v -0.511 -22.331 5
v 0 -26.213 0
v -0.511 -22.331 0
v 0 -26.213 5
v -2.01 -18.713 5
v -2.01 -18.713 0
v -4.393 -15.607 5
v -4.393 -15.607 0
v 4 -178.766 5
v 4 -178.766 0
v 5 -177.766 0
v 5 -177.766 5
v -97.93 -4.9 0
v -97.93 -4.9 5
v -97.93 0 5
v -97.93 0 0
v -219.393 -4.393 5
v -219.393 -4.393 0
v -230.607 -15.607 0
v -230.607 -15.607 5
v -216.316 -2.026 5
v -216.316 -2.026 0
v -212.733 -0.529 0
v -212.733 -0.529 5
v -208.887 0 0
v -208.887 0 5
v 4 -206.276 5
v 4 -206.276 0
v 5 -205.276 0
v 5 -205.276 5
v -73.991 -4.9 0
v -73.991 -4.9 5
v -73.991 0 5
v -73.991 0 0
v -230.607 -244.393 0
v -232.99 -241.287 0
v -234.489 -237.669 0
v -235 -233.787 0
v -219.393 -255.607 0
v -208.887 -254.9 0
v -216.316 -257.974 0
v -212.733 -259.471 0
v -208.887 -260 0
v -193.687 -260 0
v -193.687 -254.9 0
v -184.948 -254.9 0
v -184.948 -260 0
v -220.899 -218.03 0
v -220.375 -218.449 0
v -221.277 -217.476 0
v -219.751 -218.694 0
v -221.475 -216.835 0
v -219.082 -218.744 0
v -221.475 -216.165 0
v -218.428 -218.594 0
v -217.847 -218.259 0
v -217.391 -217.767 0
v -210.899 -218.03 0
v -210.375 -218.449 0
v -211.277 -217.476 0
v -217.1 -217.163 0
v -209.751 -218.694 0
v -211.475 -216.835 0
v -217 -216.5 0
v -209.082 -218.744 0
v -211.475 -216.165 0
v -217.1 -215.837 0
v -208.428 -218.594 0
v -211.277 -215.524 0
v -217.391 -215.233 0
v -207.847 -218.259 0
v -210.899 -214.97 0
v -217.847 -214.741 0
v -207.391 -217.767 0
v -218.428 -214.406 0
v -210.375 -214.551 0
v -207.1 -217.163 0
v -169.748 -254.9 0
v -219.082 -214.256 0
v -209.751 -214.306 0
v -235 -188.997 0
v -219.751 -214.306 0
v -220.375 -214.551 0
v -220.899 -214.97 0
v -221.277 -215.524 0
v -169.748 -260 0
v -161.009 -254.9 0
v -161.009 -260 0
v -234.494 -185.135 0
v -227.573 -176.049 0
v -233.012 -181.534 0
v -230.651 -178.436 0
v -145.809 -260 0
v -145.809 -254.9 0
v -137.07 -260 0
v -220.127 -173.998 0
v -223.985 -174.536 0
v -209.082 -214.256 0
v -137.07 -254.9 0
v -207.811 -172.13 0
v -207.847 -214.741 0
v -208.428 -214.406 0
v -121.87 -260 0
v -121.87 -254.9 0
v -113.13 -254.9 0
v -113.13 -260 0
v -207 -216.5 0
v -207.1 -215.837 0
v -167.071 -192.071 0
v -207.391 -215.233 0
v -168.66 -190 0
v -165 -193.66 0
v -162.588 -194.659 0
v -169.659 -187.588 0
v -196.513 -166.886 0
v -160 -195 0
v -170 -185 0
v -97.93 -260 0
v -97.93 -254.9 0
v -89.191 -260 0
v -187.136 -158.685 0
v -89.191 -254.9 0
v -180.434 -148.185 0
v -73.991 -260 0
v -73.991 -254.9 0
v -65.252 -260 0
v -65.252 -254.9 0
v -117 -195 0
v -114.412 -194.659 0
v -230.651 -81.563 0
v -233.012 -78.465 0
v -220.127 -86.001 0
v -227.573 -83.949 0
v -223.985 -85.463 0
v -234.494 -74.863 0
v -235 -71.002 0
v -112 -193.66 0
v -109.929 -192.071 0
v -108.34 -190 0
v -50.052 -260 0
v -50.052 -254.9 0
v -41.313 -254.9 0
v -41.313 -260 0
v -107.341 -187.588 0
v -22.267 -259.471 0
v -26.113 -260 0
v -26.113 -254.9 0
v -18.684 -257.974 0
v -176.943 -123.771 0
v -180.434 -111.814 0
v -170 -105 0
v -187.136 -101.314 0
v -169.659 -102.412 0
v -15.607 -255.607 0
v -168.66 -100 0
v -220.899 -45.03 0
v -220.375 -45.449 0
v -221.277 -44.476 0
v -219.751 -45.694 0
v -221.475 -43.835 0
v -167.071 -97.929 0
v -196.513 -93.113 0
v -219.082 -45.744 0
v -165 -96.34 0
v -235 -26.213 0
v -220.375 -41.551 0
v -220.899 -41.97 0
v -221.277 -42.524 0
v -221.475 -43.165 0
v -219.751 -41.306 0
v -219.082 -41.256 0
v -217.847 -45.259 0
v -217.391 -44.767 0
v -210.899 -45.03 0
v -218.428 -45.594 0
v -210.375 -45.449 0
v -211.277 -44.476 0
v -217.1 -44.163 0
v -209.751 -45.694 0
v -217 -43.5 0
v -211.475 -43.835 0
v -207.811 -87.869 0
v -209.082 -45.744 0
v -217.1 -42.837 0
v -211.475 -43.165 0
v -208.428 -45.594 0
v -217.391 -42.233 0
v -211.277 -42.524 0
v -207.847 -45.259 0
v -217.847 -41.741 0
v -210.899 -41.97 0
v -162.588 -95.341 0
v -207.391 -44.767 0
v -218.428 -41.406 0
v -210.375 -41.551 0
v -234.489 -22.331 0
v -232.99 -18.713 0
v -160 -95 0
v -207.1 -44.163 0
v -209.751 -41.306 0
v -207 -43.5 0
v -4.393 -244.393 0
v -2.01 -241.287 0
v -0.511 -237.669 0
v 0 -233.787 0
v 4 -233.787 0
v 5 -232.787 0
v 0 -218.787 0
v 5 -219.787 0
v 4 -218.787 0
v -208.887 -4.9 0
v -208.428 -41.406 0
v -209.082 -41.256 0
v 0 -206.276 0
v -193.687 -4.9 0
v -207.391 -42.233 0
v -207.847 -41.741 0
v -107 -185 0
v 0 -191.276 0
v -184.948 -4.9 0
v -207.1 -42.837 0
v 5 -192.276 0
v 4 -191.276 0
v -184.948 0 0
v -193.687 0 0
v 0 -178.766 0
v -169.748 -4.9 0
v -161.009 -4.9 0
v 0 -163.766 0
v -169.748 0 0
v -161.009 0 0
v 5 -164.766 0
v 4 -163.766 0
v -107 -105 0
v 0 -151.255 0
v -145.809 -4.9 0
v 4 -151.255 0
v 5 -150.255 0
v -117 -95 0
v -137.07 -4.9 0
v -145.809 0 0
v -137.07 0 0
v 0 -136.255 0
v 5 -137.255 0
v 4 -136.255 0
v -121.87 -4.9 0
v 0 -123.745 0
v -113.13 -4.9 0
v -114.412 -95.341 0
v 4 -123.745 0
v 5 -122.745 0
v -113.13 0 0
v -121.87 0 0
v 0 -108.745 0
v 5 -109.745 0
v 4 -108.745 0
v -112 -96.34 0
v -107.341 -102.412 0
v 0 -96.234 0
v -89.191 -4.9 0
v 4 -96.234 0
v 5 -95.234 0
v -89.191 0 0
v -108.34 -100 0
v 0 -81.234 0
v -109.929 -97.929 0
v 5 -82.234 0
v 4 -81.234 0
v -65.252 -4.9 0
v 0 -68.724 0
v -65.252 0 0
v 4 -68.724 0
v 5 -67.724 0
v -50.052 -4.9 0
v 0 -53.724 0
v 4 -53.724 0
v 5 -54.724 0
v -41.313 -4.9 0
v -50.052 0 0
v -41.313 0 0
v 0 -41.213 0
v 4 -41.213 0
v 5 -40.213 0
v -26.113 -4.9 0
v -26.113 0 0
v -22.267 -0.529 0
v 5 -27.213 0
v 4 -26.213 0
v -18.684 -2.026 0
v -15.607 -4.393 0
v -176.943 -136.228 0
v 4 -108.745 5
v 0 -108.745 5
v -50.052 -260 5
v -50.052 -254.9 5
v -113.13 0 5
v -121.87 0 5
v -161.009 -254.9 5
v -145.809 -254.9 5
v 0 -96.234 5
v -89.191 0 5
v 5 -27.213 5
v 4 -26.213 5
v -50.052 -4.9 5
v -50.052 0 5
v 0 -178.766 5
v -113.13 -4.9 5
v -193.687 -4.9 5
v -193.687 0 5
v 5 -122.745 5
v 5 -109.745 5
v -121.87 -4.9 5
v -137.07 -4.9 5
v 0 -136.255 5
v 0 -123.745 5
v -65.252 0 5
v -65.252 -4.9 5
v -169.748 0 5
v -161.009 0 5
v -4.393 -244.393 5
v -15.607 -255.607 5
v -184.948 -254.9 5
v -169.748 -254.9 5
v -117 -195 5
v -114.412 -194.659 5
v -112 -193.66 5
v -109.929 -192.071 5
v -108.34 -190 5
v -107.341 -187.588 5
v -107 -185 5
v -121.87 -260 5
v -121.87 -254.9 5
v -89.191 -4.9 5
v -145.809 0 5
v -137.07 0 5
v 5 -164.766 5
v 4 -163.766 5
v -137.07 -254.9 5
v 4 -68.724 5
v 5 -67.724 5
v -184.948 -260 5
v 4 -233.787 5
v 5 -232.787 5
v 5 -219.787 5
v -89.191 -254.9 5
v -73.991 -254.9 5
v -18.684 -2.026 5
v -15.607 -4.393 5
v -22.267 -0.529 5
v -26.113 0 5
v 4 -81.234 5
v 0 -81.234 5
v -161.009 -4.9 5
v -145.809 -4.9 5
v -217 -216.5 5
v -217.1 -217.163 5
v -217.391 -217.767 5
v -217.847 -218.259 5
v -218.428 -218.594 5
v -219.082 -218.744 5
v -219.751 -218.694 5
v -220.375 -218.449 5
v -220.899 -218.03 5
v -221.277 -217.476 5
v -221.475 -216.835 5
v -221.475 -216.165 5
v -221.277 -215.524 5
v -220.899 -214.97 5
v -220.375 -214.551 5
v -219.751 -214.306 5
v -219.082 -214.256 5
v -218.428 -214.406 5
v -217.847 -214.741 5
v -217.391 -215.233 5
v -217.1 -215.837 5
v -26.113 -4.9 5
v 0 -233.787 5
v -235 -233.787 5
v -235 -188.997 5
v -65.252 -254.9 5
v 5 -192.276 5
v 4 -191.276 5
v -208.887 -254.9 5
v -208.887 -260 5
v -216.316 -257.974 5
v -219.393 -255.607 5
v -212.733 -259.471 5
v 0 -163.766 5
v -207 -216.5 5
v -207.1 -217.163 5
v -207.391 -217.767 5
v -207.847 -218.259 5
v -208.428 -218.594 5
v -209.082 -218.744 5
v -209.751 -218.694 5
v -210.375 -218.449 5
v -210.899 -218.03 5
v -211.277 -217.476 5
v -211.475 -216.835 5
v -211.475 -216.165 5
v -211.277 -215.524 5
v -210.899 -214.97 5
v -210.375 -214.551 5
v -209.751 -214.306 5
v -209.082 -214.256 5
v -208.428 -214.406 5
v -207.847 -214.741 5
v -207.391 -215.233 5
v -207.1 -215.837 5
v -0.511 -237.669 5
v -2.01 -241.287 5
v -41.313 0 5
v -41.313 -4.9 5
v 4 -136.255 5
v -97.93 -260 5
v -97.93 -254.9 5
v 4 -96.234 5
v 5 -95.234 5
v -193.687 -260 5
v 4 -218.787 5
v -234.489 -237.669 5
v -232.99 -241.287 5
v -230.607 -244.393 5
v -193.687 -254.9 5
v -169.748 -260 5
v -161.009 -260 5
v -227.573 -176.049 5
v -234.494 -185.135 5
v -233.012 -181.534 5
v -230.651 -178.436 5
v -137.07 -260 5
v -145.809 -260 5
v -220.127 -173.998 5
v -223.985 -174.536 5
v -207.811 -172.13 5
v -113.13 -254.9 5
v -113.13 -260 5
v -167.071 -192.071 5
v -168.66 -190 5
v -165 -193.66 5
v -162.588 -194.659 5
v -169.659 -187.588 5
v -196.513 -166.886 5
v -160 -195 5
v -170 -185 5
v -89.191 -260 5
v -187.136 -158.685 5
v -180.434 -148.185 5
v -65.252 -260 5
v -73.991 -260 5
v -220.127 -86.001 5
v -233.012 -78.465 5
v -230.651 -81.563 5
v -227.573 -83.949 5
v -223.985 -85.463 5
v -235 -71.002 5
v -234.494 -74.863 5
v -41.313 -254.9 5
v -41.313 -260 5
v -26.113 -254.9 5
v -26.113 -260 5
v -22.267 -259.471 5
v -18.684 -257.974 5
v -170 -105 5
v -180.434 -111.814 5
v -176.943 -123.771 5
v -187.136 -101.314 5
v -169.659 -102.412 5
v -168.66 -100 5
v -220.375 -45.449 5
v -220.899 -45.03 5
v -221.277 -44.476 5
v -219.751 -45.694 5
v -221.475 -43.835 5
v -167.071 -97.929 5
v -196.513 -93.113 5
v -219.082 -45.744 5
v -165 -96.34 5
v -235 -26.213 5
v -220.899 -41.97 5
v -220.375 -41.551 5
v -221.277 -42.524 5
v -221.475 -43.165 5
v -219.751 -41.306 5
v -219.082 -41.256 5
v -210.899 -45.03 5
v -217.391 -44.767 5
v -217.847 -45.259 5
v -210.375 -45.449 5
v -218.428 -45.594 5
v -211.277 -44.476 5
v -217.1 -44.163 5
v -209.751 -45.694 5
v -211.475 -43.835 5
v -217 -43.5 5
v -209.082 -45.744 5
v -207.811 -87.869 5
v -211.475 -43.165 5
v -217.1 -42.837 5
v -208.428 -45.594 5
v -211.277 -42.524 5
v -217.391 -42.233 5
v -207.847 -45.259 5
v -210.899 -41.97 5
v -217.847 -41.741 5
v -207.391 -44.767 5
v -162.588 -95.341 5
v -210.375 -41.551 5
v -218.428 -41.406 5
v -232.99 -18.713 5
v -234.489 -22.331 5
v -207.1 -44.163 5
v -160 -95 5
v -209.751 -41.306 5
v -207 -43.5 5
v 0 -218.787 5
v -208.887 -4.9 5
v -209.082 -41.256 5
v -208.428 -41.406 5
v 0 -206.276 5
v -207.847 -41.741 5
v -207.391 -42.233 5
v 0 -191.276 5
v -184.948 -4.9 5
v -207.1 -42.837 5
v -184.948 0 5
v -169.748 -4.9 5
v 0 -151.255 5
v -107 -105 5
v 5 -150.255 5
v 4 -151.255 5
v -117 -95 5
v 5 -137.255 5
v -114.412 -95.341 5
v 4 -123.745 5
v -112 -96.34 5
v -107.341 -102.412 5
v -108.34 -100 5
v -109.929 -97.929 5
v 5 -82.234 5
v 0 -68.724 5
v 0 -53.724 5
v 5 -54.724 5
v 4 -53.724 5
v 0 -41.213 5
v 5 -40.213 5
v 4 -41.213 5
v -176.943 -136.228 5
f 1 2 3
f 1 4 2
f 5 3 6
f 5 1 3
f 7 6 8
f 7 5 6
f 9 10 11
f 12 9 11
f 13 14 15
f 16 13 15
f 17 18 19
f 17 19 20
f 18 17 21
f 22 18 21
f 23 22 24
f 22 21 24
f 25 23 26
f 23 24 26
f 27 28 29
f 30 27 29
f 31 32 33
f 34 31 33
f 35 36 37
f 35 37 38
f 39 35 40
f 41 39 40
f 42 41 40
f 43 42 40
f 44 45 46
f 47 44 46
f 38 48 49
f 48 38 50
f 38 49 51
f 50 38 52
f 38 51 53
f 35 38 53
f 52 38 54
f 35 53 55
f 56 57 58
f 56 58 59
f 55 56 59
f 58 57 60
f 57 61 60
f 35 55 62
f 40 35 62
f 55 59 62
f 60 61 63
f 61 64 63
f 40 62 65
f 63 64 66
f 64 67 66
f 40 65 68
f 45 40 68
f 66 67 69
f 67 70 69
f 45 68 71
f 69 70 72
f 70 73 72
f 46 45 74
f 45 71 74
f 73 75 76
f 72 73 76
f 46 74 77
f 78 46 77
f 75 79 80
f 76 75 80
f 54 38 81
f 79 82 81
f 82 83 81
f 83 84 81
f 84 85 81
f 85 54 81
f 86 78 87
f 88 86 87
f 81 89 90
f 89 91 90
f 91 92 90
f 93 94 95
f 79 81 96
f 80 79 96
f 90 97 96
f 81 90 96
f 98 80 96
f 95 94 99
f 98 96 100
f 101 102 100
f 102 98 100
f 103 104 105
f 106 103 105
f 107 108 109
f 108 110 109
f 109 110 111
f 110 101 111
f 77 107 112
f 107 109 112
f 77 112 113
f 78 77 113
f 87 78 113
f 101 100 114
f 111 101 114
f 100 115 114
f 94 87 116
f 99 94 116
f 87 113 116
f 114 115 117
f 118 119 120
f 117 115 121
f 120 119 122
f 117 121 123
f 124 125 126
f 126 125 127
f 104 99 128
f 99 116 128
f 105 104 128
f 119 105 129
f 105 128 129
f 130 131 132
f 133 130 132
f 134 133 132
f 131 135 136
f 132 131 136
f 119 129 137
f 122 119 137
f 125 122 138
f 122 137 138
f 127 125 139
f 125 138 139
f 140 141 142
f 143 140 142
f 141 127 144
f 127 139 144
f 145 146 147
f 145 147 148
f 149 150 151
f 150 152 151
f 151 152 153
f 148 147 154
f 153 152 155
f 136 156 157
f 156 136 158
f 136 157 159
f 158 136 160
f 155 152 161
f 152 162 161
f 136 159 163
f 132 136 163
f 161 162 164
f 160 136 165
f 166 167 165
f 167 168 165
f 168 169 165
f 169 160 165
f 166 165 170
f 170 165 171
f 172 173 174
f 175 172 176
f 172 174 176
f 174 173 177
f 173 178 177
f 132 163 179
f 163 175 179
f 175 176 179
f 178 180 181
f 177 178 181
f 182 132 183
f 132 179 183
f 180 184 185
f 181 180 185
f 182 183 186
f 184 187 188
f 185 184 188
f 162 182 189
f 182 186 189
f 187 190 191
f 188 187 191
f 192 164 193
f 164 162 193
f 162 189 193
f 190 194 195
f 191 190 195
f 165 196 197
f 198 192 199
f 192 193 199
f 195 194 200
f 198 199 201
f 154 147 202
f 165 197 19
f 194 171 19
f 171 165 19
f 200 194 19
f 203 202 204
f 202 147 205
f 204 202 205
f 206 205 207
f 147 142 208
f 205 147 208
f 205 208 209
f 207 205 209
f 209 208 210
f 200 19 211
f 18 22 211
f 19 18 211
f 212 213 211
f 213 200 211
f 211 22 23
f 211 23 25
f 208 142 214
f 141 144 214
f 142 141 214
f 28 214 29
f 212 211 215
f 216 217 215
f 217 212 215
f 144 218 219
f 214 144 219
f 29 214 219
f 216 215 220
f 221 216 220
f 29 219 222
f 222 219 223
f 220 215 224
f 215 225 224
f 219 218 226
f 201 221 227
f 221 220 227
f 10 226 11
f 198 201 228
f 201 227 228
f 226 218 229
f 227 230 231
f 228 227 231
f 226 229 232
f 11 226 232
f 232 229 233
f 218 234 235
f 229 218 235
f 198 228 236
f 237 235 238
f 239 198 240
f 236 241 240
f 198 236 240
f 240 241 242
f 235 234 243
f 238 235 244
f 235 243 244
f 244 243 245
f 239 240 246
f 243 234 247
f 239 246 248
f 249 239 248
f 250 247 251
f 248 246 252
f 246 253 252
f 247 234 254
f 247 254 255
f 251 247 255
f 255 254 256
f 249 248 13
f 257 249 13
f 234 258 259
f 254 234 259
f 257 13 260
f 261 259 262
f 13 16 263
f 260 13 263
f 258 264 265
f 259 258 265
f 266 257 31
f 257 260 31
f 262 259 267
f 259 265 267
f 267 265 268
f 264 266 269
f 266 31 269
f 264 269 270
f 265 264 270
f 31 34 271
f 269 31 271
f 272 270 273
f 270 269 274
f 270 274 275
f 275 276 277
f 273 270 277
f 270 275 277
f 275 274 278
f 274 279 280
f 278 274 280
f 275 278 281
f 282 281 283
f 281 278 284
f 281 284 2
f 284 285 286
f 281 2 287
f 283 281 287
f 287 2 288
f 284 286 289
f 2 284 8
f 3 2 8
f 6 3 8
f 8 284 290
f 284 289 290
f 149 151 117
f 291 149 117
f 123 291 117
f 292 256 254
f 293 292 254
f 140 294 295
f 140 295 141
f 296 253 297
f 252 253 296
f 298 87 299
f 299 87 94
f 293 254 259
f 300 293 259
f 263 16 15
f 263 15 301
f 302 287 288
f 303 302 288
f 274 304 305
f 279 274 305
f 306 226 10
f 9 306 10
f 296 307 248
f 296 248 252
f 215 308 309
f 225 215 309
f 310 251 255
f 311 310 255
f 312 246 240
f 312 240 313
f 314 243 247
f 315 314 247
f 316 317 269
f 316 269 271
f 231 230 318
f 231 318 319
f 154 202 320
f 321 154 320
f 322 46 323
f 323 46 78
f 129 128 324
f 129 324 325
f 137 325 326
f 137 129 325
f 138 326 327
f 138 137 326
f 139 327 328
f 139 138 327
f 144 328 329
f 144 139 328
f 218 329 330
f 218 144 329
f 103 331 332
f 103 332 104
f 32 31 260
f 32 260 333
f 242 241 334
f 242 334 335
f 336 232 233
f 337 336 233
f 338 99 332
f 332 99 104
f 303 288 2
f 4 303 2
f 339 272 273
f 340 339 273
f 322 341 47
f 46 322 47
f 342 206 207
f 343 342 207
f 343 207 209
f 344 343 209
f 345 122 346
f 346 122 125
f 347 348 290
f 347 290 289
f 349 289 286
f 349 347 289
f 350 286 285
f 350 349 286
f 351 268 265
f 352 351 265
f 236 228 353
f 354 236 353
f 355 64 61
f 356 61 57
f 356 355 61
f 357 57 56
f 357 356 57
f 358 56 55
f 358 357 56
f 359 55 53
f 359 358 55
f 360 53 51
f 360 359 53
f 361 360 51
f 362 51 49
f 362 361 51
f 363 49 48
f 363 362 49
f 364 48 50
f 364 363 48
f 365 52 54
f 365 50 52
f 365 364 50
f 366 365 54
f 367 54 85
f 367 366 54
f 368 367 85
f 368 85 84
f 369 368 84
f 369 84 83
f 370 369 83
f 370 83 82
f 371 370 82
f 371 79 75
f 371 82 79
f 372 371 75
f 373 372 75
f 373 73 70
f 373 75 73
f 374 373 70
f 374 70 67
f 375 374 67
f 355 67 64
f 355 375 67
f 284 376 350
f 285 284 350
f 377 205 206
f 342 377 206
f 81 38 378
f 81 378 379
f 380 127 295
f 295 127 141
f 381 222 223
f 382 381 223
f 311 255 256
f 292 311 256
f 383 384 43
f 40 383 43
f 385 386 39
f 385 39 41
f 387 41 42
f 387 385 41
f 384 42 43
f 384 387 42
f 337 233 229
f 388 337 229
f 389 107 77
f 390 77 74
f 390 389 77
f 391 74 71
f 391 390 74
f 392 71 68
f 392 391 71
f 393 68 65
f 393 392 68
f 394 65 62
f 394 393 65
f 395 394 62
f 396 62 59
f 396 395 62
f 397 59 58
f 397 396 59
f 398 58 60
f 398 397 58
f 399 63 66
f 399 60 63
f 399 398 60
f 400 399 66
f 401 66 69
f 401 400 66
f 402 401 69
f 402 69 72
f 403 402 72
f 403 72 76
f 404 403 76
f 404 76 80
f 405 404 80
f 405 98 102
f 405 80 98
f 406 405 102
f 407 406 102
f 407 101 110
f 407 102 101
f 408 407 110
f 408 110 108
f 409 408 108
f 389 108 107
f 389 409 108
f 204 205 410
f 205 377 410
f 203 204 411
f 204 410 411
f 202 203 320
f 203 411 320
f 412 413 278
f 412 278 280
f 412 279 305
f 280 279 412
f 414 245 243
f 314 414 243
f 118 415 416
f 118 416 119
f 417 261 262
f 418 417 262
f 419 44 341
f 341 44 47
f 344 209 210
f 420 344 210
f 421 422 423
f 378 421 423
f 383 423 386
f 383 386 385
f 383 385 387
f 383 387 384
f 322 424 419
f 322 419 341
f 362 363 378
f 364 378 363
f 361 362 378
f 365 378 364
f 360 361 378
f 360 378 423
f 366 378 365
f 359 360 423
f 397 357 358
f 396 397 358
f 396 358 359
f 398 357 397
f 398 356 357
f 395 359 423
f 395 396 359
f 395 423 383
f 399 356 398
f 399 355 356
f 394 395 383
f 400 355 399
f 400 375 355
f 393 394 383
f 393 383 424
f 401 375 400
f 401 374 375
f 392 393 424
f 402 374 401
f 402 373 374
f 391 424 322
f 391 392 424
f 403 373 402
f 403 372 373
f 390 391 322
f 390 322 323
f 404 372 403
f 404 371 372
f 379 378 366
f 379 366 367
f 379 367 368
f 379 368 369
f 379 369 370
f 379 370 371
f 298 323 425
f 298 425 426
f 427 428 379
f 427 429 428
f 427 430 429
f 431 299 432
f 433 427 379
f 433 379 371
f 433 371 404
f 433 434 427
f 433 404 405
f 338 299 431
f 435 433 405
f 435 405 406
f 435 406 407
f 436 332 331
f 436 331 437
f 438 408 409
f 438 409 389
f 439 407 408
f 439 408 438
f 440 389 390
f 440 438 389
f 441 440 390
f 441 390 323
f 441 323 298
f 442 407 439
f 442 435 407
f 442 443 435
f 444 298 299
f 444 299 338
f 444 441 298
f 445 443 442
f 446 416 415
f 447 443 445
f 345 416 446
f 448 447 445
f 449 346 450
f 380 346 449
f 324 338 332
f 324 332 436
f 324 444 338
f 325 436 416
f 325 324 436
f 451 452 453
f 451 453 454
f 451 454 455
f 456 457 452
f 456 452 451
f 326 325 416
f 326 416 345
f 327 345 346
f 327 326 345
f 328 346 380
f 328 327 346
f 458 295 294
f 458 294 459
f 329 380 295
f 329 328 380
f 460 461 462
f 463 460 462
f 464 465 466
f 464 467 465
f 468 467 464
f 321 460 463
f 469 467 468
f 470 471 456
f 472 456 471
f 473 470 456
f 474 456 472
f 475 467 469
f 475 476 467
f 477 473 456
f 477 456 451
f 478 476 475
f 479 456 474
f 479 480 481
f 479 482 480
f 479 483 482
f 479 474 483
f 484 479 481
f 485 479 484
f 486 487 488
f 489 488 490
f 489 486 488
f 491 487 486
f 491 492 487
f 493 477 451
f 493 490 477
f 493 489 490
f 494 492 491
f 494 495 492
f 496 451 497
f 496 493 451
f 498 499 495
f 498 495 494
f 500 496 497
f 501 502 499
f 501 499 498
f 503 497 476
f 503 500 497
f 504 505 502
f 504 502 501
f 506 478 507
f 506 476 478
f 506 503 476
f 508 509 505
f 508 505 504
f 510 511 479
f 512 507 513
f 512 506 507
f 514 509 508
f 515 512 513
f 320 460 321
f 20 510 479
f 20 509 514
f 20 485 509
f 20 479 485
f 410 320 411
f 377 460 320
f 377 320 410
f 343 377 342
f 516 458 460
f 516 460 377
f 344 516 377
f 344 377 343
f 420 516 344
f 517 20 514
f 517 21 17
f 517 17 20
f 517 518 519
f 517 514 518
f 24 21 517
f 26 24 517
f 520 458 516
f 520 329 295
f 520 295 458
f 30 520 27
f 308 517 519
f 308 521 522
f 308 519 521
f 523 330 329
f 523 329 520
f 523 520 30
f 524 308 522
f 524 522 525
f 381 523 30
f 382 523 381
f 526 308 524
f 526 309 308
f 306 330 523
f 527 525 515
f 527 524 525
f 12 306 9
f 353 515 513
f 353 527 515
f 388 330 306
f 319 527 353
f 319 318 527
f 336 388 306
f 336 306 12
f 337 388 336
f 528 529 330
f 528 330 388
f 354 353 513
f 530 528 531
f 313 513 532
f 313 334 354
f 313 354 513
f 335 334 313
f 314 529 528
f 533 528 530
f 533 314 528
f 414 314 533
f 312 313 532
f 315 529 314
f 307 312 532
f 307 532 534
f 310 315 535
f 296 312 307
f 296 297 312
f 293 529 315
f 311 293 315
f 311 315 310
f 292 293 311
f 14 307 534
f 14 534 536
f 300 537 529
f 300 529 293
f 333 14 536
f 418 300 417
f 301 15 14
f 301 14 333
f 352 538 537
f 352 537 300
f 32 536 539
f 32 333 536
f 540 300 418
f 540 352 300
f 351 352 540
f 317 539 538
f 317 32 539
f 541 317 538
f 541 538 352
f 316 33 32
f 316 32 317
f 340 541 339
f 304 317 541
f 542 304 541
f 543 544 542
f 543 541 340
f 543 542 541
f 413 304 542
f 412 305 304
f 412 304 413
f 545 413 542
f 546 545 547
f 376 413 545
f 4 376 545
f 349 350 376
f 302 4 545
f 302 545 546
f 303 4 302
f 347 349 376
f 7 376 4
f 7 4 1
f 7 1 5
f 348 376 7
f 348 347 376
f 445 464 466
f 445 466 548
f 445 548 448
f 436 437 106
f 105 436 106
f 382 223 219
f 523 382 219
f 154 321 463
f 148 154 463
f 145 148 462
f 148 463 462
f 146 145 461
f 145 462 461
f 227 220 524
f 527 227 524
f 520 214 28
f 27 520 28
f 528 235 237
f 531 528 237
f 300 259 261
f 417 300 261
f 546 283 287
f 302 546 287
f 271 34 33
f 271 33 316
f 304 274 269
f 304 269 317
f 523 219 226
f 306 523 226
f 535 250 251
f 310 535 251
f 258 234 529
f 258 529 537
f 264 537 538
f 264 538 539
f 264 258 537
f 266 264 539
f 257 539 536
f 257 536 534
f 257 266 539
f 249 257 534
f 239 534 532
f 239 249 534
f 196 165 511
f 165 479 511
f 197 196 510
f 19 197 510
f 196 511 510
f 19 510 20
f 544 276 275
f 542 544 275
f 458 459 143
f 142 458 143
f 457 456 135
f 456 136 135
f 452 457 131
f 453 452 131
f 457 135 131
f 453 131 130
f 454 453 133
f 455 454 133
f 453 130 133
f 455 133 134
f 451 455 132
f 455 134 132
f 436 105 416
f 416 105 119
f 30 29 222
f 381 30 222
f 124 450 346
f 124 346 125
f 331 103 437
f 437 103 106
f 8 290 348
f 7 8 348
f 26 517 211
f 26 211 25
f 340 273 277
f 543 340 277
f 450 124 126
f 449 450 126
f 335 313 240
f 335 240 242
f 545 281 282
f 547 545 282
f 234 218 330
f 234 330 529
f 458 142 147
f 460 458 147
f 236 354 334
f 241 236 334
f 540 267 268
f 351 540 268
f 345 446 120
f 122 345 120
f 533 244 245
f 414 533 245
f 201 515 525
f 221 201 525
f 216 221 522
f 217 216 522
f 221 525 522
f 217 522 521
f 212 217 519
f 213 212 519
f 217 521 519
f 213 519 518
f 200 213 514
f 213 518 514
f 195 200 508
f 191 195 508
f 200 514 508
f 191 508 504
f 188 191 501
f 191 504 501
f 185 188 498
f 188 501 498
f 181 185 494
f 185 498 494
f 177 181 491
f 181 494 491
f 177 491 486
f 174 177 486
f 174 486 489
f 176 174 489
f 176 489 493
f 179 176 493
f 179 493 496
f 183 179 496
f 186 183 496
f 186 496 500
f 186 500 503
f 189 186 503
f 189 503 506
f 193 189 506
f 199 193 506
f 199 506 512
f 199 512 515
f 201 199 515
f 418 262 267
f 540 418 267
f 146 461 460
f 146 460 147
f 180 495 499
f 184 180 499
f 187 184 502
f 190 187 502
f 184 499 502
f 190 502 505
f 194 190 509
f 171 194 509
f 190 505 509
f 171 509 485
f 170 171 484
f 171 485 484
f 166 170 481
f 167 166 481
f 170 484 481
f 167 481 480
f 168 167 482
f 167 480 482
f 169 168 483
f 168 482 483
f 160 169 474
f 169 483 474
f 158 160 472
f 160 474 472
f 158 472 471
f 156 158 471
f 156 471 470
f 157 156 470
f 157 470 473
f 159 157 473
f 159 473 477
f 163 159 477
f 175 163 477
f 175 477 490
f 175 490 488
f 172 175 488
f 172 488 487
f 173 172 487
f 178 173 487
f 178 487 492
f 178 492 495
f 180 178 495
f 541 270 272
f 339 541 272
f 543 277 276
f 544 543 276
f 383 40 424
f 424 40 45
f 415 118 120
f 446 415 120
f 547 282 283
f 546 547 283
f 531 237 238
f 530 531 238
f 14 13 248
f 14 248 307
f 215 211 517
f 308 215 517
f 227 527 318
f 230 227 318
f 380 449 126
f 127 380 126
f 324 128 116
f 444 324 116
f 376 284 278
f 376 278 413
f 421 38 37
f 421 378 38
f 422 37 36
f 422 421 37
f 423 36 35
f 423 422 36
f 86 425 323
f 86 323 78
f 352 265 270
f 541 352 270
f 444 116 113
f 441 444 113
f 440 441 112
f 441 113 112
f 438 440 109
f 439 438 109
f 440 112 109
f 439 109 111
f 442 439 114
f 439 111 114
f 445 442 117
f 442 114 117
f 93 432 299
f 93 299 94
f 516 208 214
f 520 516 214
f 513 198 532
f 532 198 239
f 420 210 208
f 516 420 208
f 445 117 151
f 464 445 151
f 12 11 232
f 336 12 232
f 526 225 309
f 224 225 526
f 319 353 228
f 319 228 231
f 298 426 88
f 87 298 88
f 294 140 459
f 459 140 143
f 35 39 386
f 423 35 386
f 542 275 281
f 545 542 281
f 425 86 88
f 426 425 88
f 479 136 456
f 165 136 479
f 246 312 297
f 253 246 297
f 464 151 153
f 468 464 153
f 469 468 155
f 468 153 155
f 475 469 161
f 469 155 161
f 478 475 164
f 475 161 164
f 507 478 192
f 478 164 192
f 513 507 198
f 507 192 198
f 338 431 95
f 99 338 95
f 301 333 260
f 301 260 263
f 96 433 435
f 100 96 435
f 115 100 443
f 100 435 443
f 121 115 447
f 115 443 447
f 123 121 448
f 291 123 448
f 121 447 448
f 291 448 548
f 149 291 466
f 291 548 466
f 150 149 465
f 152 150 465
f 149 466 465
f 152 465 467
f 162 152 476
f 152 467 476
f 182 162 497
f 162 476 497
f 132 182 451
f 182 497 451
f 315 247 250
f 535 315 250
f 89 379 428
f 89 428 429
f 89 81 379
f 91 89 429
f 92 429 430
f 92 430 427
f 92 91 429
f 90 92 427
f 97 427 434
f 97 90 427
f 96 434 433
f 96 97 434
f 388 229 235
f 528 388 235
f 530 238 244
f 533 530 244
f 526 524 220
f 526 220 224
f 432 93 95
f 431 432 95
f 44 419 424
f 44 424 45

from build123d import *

# Parameters (mm, degrees)
ESQUISSE1_W                            = 235
ESQUISSE1_H                            = 260
BOSS_EXTRU_1_DEPTH                     = 5
ENL_V_MAT_EXTRU_1_DEPTH                = 351.499643366
CHANFREIN1_SIZE                        = 20
CONG_1_R                               = 15
CHANFREIN2_SIZE                        = 20
CONG_2_R                               = 15
ENL_V_MAT_EXTRU_2_DEPTH                = 351.499643366
CHANFREIN3_SIZE                        = 20
CHANFREIN4_SIZE                        = 20
CONG_3_R                               = 15
BOSS_EXTRU_3_DEPTH                     = 5
TENON_ET_MORTAISE_TENON1_DEPTH         = 5
TENON_START                            = -260
TENON_ET_MORTAISE_RAINURE1_OUTLINE_W   = 15.2
TENON_ET_MORTAISE_RAINURE1_OUTLINE_H   = 5
TENON_ET_MORTAISE_RAINURE1_DEPTH       = 5.1
TENON_START_2                          = -208.886796564
TENON_ET_MORTAISE_RAINURE2_OUTLINE_W   = 4.9
TENON_ET_MORTAISE_RAINURE2_OUTLINE_H   = 5
TENON_ET_MORTAISE_RAINURE2_DEPTH       = 15.2
TENON_START_3                          = -184.947711832
TENON_ET_MORTAISE_RAINURE2_2_OUTLINE_W = 4.9
TENON_ET_MORTAISE_RAINURE2_2_OUTLINE_H = 5
TENON_ET_MORTAISE_RAINURE2_2_DEPTH     = 15.2
TENON_START_4                          = -161.008627099
TENON_ET_MORTAISE_RAINURE2_3_OUTLINE_W = 4.9
TENON_ET_MORTAISE_RAINURE2_3_OUTLINE_H = 5
TENON_ET_MORTAISE_RAINURE2_3_DEPTH     = 15.2
TENON_START_5                          = -137.069542366
TENON_ET_MORTAISE_RAINURE2_4_OUTLINE_W = 4.9
TENON_ET_MORTAISE_RAINURE2_4_OUTLINE_H = 5
TENON_ET_MORTAISE_RAINURE2_4_DEPTH     = 15.2
TENON_START_6                          = -113.130457634
TENON_ET_MORTAISE_RAINURE2_5_OUTLINE_W = 4.9
TENON_ET_MORTAISE_RAINURE2_5_OUTLINE_H = 5
TENON_ET_MORTAISE_RAINURE2_5_DEPTH     = 15.2
TENON_START_7                          = -89.191372901
TENON_ET_MORTAISE_RAINURE2_6_OUTLINE_W = 4.9
TENON_ET_MORTAISE_RAINURE2_6_OUTLINE_H = 5
TENON_ET_MORTAISE_RAINURE2_6_DEPTH     = 15.2
TENON_START_8                          = -65.252288168
TENON_ET_MORTAISE_RAINURE2_7_OUTLINE_W = 4.9
TENON_ET_MORTAISE_RAINURE2_7_OUTLINE_H = 5
TENON_ET_MORTAISE_RAINURE2_7_DEPTH     = 15.2
TENON_START_9                          = -41.313203436
TENON_ET_MORTAISE_RAINURE2_8_OUTLINE_W = 4.9
TENON_ET_MORTAISE_RAINURE2_8_OUTLINE_H = 5
TENON_ET_MORTAISE_RAINURE2_8_DEPTH     = 15.2
ESQUISSE6_R                            = 2.25
ENL_V_MAT_EXTRU_3_DEPTH                = 351.499643366


# Read off the part's stored shape, not the designer's step: Tenon et mortaise-Tenon1, Tenon et mortaise-Rainure1, Tenon et mortaise-Rainure2
with BuildPart() as part:
    # Esquisse1 → Boss.-Extru.1 (new body)
    with BuildSketch(Plane.XY):
        with Locations((-117.5, -130)):
            Rectangle(ESQUISSE1_W, ESQUISSE1_H)
    extrude(amount=BOSS_EXTRU_1_DEPTH)

    # Esquisse2 → Enlèv. mat.-Extru.1 (cut, through all)
    with BuildSketch(Plane.XY.offset(5)):
        with BuildLine():
            Line((-235, -88.457244293), (-235, -171.541538838))
            ThreePointArc((-235, -171.541538838), (-176.5, -129.999391565), (-235, -88.457244293))
        make_face()
    extrude(amount=-ENL_V_MAT_EXTRU_1_DEPTH, mode=Mode.SUBTRACT)

    # Chanfrein1
    chanfrein1_edges = [part.edges().sort_by_distance(p)[0] for p in [
        (-235, -260, 2.5),
    ]]
    chamfer(chanfrein1_edges, length=CHANFREIN1_SIZE)

    # Congé1
    cong_1_edges = [part.edges().sort_by_distance(p)[0] for p in [
        (-215, -260, 2.5),
        (-235, -240, 2.5),
    ]]
    fillet(cong_1_edges, radius=CONG_1_R)

    # Chanfrein2
    chanfrein2_edges = [part.edges().sort_by_distance(p)[0] for p in [
        (-235, 0, 2.5),
    ]]
    chamfer(chanfrein2_edges, length=CHANFREIN2_SIZE)

    # Congé2
    cong_2_edges = [part.edges().sort_by_distance(p)[0] for p in [
        (-235, -20, 2.5),
        (-215, 0, 2.5),
    ]]
    fillet(cong_2_edges, radius=CONG_2_R)

    # Esquisse4 → Enlèv. mat.-Extru.2 (cut, through all)
    with BuildSketch(Plane(origin=(0, 0, 0), x_dir=(-1, 0, 0), z_dir=(0, 0, -1))):
        with BuildLine():
            Line((20, -195), (160, -195))
            ThreePointArc((160, -195), (167.071067812, -192.071067812), (170, -185))
            Line((170, -185), (170, -105))
            ThreePointArc((170, -105), (167.071067812, -97.928932188), (160, -95))
            Line((160, -95), (60, -95))
            ThreePointArc((60, -95), (52.928932188, -97.928932188), (50, -105))
            Line((50, -105), (50, -135))
            ThreePointArc((50, -135), (47.071067812, -142.071067812), (40, -145))
            Line((40, -145), (20, -145))
            ThreePointArc((20, -145), (12.928932188, -147.928932188), (10, -155))
            Line((10, -155), (10, -185))
            ThreePointArc((10, -185), (12.928932188, -192.071067812), (20, -195))
        make_face()
    extrude(amount=-ENL_V_MAT_EXTRU_2_DEPTH, mode=Mode.SUBTRACT)

    # Chanfrein3
    chanfrein3_edges = [part.edges().sort_by_distance(p)[0] for p in [
        (0, -260, 2.5),
    ]]
    chamfer(chanfrein3_edges, length=CHANFREIN3_SIZE)

    # Chanfrein4
    chanfrein4_edges = [part.edges().sort_by_distance(p)[0] for p in [
        (0, 0, 2.5),
    ]]
    chamfer(chanfrein4_edges, length=CHANFREIN4_SIZE)

    # Congé3
    cong_3_edges = [part.edges().sort_by_distance(p)[0] for p in [
        (0, -240, 2.5),
        (-20, -260, 2.5),
        (-20, 0, 2.5),
        (0, -20, 2.5),
        (-235, -171.541538838, 2.5),
        (-235, -88.457244293, 2.5),
    ]]
    fillet(cong_3_edges, radius=CONG_3_R)

    # Esquisse5 → Boss.-Extru.3 (add, through all)
    with BuildSketch(Plane(origin=(0, 0, 0), x_dir=(-1, 0, 0), z_dir=(0, 0, -1))):
        with BuildLine():
            ThreePointArc((117, -195), (109.928932188, -192.071067812), (107, -185))
            Line((107, -185), (107, -105))
            ThreePointArc((107, -105), (109.928932188, -97.928932188), (117, -95))
            Line((117, -95), (60, -95))
            ThreePointArc((60, -95), (52.928932188, -97.928932188), (50, -105))
            Line((50, -105), (50, -135))
            ThreePointArc((50, -135), (47.071067812, -142.071067812), (40, -145))
            Line((40, -145), (20, -145))
            ThreePointArc((20, -145), (12.928932188, -147.928932188), (10, -155))
            Line((10, -155), (10, -185))
            ThreePointArc((10, -185), (12.928932188, -192.071067812), (20, -195))
            Line((20, -195), (117, -195))
        make_face()
    extrude(amount=-BOSS_EXTRU_3_DEPTH)

    # Tenon et mortaise-Tenon1 outline → Tenon et mortaise-Tenon1 (add)
    with BuildSketch(Plane.XY):
        Polygon((0, -26.213203436), (0, -41.213203436), (4, -41.213203436), (5, -40.213203436), (5, -27.213203436), (4, -26.213203436), align=None)
        Polygon((0, -53.72371674), (0, -68.72371674), (4, -68.72371674), (5, -67.72371674), (5, -54.72371674), (4, -53.72371674), align=None)
        Polygon((0, -81.234230044), (0, -96.234230044), (4, -96.234230044), (5, -95.234230044), (5, -82.234230044), (4, -81.234230044), align=None)
        Polygon((0, -108.744743348), (0, -123.744743348), (4, -123.744743348), (5, -122.744743348), (5, -109.744743348), (4, -108.744743348), align=None)
        Polygon((0, -136.255256652), (0, -151.255256652), (4, -151.255256652), (5, -150.255256652), (5, -137.255256652), (4, -136.255256652), align=None)
        Polygon((0, -163.765769956), (0, -178.765769956), (4, -178.765769956), (5, -177.765769956), (5, -164.765769956), (4, -163.765769956), align=None)
        Polygon((0, -191.27628326), (0, -206.27628326), (4, -206.27628326), (5, -205.27628326), (5, -192.27628326), (4, -191.27628326), align=None)
        Polygon((4, -218.786796564), (0, -218.786796564), (0, -233.786796564), (4, -233.786796564), (5, -232.786796564), (5, -219.786796564), align=None)
    extrude(amount=TENON_ET_MORTAISE_TENON1_DEPTH)

    # Tenon et mortaise-Rainure1 outline → Tenon et mortaise-Rainure1 (cut)
    with BuildSketch(Plane(origin=(0, 0, 0), x_dir=(1, 0, 0), z_dir=(0, 1, 0)).offset(TENON_START)):
        with Locations((-33.713203436, -2.5)):
            Rectangle(TENON_ET_MORTAISE_RAINURE1_OUTLINE_W, TENON_ET_MORTAISE_RAINURE1_OUTLINE_H)
        with Locations((-57.652288168, -2.5)):
            Rectangle(TENON_ET_MORTAISE_RAINURE1_OUTLINE_W, TENON_ET_MORTAISE_RAINURE1_OUTLINE_H)
        with Locations((-81.591372901, -2.5)):
            Rectangle(TENON_ET_MORTAISE_RAINURE1_OUTLINE_W, TENON_ET_MORTAISE_RAINURE1_OUTLINE_H)
        with Locations((-105.530457634, -2.5)):
            Rectangle(TENON_ET_MORTAISE_RAINURE1_OUTLINE_W, TENON_ET_MORTAISE_RAINURE1_OUTLINE_H)
        with Locations((-129.469542366, -2.5)):
            Rectangle(TENON_ET_MORTAISE_RAINURE1_OUTLINE_W, TENON_ET_MORTAISE_RAINURE1_OUTLINE_H)
        with Locations((-153.408627099, -2.5)):
            Rectangle(TENON_ET_MORTAISE_RAINURE1_OUTLINE_W, TENON_ET_MORTAISE_RAINURE1_OUTLINE_H)
        with Locations((-177.347711832, -2.5)):
            Rectangle(TENON_ET_MORTAISE_RAINURE1_OUTLINE_W, TENON_ET_MORTAISE_RAINURE1_OUTLINE_H)
        with Locations((-201.286796564, -2.5)):
            Rectangle(TENON_ET_MORTAISE_RAINURE1_OUTLINE_W, TENON_ET_MORTAISE_RAINURE1_OUTLINE_H)
    extrude(amount=TENON_ET_MORTAISE_RAINURE1_DEPTH, mode=Mode.SUBTRACT)

    # Tenon et mortaise-Rainure2 outline → Tenon et mortaise-Rainure2 (cut)
    with BuildSketch(Plane.YZ.offset(TENON_START_2)):
        with Locations((-2.45, 2.5)):
            Rectangle(TENON_ET_MORTAISE_RAINURE2_OUTLINE_W, TENON_ET_MORTAISE_RAINURE2_OUTLINE_H)
    extrude(amount=TENON_ET_MORTAISE_RAINURE2_DEPTH, mode=Mode.SUBTRACT)

    # Tenon et mortaise-Rainure2 2 outline → Tenon et mortaise-Rainure2 2 (cut)
    with BuildSketch(Plane.YZ.offset(TENON_START_3)):
        with Locations((-2.45, 2.5)):
            Rectangle(TENON_ET_MORTAISE_RAINURE2_2_OUTLINE_W, TENON_ET_MORTAISE_RAINURE2_2_OUTLINE_H)
    extrude(amount=TENON_ET_MORTAISE_RAINURE2_2_DEPTH, mode=Mode.SUBTRACT)

    # Tenon et mortaise-Rainure2 3 outline → Tenon et mortaise-Rainure2 3 (cut)
    with BuildSketch(Plane.YZ.offset(TENON_START_4)):
        with Locations((-2.45, 2.5)):
            Rectangle(TENON_ET_MORTAISE_RAINURE2_3_OUTLINE_W, TENON_ET_MORTAISE_RAINURE2_3_OUTLINE_H)
    extrude(amount=TENON_ET_MORTAISE_RAINURE2_3_DEPTH, mode=Mode.SUBTRACT)

    # Tenon et mortaise-Rainure2 4 outline → Tenon et mortaise-Rainure2 4 (cut)
    with BuildSketch(Plane.YZ.offset(TENON_START_5)):
        with Locations((-2.45, 2.5)):
            Rectangle(TENON_ET_MORTAISE_RAINURE2_4_OUTLINE_W, TENON_ET_MORTAISE_RAINURE2_4_OUTLINE_H)
    extrude(amount=TENON_ET_MORTAISE_RAINURE2_4_DEPTH, mode=Mode.SUBTRACT)

    # Tenon et mortaise-Rainure2 5 outline → Tenon et mortaise-Rainure2 5 (cut)
    with BuildSketch(Plane.YZ.offset(TENON_START_6)):
        with Locations((-2.45, 2.5)):
            Rectangle(TENON_ET_MORTAISE_RAINURE2_5_OUTLINE_W, TENON_ET_MORTAISE_RAINURE2_5_OUTLINE_H)
    extrude(amount=TENON_ET_MORTAISE_RAINURE2_5_DEPTH, mode=Mode.SUBTRACT)

    # Tenon et mortaise-Rainure2 6 outline → Tenon et mortaise-Rainure2 6 (cut)
    with BuildSketch(Plane.YZ.offset(TENON_START_7)):
        with Locations((-2.45, 2.5)):
            Rectangle(TENON_ET_MORTAISE_RAINURE2_6_OUTLINE_W, TENON_ET_MORTAISE_RAINURE2_6_OUTLINE_H)
    extrude(amount=TENON_ET_MORTAISE_RAINURE2_6_DEPTH, mode=Mode.SUBTRACT)

    # Tenon et mortaise-Rainure2 7 outline → Tenon et mortaise-Rainure2 7 (cut)
    with BuildSketch(Plane.YZ.offset(TENON_START_8)):
        with Locations((-2.45, 2.5)):
            Rectangle(TENON_ET_MORTAISE_RAINURE2_7_OUTLINE_W, TENON_ET_MORTAISE_RAINURE2_7_OUTLINE_H)
    extrude(amount=TENON_ET_MORTAISE_RAINURE2_7_DEPTH, mode=Mode.SUBTRACT)

    # Tenon et mortaise-Rainure2 8 outline → Tenon et mortaise-Rainure2 8 (cut)
    with BuildSketch(Plane.YZ.offset(TENON_START_9)):
        with Locations((-2.45, 2.5)):
            Rectangle(TENON_ET_MORTAISE_RAINURE2_8_OUTLINE_W, TENON_ET_MORTAISE_RAINURE2_8_OUTLINE_H)
    extrude(amount=TENON_ET_MORTAISE_RAINURE2_8_DEPTH, mode=Mode.SUBTRACT)

    # Esquisse6 → Enlèv. mat.-Extru.3 (cut, through all)
    with BuildSketch(Plane.XY.offset(5)):
        with Locations((-209.25, -43.5)):
            Circle(ESQUISSE6_R)
        with Locations((-219.25, -43.5)):
            Circle(ESQUISSE6_R)
    enl_v_mat_extru_3 = extrude(amount=-ENL_V_MAT_EXTRU_3_DEPTH, mode=Mode.SUBTRACT)

    # Symétrie1: Enlèv. mat.-Extru.3 across plane
    add(enl_v_mat_extru_3.mirror(Plane.ZX.offset(-130)), mode=Mode.SUBTRACT)


solid = part.part
